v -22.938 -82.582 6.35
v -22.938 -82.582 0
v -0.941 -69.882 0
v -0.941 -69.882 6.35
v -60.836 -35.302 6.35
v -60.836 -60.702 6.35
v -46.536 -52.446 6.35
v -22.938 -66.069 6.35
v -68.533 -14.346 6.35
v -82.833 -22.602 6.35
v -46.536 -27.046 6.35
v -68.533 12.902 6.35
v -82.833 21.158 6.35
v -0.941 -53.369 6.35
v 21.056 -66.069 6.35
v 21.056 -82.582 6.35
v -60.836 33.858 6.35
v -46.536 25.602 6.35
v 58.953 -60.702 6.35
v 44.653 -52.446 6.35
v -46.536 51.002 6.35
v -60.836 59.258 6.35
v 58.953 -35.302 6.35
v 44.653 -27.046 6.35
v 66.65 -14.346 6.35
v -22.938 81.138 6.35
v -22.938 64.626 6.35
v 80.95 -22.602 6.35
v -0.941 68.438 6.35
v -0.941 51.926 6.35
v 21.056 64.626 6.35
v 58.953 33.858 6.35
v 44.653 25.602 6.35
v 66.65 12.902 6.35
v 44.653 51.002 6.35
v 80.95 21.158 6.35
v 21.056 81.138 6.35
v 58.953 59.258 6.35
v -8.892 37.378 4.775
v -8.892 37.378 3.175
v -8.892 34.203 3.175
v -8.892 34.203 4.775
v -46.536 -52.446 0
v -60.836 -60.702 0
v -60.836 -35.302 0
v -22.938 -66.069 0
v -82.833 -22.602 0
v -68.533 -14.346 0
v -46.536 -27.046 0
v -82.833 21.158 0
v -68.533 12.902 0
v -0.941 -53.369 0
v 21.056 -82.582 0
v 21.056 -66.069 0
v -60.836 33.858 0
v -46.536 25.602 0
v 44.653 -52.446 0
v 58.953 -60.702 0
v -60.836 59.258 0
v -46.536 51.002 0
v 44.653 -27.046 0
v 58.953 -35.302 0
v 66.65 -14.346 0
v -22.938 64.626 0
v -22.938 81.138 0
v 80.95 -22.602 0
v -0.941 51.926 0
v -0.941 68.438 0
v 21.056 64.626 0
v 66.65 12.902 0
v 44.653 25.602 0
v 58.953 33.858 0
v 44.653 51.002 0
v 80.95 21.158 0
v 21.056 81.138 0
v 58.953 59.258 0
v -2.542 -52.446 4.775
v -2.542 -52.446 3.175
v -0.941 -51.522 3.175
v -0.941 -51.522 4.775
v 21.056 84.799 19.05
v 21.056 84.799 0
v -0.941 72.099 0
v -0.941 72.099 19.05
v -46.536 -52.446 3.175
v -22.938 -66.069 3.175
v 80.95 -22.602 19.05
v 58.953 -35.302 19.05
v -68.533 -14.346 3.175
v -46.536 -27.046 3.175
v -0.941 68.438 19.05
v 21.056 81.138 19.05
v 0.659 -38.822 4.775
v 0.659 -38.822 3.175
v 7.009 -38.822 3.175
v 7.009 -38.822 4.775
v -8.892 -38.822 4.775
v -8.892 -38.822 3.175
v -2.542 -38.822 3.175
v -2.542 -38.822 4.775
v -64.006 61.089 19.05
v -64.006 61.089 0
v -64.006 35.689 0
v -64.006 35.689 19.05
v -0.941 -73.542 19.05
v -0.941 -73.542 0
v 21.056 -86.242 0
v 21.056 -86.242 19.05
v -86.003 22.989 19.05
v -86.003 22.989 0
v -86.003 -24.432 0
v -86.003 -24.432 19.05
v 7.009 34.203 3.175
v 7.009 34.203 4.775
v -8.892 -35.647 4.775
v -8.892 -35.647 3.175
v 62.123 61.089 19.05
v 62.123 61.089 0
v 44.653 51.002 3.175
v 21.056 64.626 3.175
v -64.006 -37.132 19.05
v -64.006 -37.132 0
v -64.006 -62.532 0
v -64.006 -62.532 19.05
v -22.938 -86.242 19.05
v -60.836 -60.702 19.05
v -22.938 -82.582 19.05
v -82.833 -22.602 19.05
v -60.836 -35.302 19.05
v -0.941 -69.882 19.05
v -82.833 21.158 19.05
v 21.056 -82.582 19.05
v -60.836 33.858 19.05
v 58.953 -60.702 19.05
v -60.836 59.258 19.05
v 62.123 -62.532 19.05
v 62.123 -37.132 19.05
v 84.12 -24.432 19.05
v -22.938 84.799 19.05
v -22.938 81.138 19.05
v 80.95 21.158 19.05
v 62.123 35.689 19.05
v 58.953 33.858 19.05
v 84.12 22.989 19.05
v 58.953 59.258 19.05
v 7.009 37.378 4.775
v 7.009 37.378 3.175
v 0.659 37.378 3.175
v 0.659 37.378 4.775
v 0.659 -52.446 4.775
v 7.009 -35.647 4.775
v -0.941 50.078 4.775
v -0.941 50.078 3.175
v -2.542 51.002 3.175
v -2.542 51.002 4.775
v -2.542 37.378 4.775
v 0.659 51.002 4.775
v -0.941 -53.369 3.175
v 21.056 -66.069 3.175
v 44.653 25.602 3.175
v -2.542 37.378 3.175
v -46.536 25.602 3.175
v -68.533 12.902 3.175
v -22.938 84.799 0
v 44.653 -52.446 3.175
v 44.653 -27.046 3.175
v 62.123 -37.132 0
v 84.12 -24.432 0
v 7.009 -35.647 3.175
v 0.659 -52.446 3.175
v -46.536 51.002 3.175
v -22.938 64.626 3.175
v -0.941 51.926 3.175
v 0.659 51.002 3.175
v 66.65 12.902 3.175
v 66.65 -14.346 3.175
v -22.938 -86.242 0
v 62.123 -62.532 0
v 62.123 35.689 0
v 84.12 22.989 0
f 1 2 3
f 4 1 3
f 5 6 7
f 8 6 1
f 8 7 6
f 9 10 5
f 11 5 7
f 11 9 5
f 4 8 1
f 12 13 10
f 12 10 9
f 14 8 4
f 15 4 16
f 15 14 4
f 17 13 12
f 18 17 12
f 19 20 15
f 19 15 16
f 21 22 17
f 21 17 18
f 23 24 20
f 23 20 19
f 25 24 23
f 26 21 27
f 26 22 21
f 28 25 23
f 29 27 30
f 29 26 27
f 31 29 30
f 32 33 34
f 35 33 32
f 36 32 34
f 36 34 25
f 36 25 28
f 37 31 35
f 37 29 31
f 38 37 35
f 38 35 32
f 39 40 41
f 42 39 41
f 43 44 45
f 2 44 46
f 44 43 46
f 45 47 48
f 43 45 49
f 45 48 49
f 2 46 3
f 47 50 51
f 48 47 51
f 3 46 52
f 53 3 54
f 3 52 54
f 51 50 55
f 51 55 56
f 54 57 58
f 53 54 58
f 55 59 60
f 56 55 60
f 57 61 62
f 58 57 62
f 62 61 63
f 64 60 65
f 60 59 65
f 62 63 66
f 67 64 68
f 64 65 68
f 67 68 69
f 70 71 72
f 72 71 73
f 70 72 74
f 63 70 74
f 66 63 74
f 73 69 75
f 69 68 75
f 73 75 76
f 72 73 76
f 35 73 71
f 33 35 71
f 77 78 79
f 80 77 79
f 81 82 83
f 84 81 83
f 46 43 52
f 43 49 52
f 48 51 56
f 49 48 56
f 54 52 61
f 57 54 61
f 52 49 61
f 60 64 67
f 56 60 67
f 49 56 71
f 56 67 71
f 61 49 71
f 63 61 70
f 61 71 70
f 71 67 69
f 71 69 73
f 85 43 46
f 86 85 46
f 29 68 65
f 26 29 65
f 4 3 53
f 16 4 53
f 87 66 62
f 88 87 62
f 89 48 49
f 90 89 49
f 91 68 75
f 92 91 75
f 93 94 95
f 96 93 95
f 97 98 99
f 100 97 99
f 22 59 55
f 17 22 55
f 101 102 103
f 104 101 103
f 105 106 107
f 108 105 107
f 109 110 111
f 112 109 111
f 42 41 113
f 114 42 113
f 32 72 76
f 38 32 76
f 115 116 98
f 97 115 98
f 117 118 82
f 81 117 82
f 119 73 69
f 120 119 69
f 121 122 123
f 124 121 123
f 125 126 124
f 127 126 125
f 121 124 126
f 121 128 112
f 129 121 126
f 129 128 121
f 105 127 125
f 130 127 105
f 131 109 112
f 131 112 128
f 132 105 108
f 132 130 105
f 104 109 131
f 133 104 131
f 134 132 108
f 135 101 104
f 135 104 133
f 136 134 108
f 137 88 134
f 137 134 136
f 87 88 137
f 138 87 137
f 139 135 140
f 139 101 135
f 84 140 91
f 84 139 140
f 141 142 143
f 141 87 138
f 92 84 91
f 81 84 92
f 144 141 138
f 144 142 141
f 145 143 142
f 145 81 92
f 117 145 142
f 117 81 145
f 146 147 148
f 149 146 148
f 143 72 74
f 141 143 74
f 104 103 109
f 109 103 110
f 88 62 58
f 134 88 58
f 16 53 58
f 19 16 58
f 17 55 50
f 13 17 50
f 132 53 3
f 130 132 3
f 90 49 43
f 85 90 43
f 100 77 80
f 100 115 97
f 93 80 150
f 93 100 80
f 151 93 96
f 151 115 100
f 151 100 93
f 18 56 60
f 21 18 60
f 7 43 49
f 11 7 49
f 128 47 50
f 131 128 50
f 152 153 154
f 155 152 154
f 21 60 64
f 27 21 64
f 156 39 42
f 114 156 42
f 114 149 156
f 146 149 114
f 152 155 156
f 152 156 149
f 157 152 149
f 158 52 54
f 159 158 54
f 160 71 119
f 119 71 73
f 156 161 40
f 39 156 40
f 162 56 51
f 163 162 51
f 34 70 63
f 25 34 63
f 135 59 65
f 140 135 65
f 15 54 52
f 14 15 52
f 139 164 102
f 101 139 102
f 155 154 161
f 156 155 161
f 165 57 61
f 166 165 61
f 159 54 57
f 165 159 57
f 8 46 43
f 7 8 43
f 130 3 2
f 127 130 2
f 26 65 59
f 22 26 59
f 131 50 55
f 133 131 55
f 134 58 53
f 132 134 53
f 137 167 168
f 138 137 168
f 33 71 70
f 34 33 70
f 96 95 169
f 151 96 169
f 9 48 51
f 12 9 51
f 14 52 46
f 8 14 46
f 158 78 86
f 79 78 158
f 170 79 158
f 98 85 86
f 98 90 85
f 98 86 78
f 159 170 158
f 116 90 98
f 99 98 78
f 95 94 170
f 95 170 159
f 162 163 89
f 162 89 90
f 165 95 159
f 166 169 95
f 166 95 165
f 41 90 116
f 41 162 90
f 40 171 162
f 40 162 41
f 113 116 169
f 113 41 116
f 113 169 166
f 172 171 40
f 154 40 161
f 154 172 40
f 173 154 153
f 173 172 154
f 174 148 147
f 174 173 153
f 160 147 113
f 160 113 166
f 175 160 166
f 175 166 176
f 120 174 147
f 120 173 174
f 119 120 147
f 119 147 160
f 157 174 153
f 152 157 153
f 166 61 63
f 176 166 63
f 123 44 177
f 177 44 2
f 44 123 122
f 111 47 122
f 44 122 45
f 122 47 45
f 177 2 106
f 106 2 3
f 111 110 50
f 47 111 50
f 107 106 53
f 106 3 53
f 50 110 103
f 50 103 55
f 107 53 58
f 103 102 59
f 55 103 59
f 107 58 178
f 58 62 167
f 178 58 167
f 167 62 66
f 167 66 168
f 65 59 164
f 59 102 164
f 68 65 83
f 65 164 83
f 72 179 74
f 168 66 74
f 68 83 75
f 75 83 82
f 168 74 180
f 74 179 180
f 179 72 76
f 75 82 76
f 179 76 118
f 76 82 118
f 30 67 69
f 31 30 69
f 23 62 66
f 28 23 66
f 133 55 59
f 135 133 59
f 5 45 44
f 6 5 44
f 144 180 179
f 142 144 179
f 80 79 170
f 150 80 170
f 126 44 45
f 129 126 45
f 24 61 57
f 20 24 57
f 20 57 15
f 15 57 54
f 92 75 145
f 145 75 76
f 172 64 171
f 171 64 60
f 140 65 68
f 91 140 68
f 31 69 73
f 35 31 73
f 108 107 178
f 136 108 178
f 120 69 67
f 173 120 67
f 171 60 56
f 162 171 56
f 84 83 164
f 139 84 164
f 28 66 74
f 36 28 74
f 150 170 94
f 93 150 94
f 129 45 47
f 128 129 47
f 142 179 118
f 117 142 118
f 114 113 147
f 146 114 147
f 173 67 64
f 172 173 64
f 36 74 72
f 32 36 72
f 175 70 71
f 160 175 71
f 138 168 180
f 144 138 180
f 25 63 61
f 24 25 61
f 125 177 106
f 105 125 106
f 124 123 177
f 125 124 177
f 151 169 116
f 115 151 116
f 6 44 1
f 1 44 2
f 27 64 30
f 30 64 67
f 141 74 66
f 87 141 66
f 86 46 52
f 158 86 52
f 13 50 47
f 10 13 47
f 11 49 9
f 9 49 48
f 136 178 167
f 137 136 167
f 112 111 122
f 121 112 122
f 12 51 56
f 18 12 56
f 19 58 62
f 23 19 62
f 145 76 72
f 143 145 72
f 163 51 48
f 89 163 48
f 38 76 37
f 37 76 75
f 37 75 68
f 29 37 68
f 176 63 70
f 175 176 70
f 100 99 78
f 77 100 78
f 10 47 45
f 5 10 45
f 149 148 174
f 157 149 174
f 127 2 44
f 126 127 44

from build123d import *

# Parameters (mm, degrees)
F1_DEPTH = 6.35
F2_DEPTH = 19.05
F3_DEPTH = 3.175
F4_DEPTH = 4.7752


with BuildPart() as f1:
    # F0 (on Top) → F1 (new body)
    with BuildSketch(Plane.XY):
        Polygon((-0.9413762387, 68.4384813374), (-22.9384214948, 81.1384813374), (-60.8358643949, 59.2583824775), (-60.8358643949, 33.8583824775), (-82.832909651, 21.1583824775), (-82.832909651, -22.6018152425), (-60.8358643949, -35.3018152425), (-60.8358643949, -60.7018152425), (-22.9384214948, -82.5819141025), (-0.9413762387, -69.8819141025), (21.0556690175, -82.5819141025), (58.9531119176, -60.7018152425), (58.9531119176, -35.3018152425), (80.9501571737, -22.6018152425), (80.9501571737, 21.1583824775), (58.9531119176, 33.8583824775), (58.9531119176, 59.2583824775), (21.0556690175, 81.1384813374), align=None)
        Polygon((-70.1329112053, 13.8260349561), (-48.1358659492, 26.5260349561), (-48.1358659492, 51.9260349561), (-22.9384214948, 66.4737862947), (-0.9413762387, 53.7737862947), (21.0556690175, 66.4737862947), (46.2531134718, 51.9260349561), (46.2531134718, 26.5260349561), (68.250158728, 13.8260349561), (68.250158728, -15.2694677211), (46.2531134718, -27.9694677211), (46.2531134718, -53.3694677211), (21.0556690175, -67.9172190598), (-0.9413762387, -55.2172190598), (-22.9384214948, -67.9172190598), (-48.1358659492, -53.3694677211), (-48.1358659492, -27.9694677211), (-70.1329112053, -15.2694677211), align=None, mode=Mode.SUBTRACT)
        Polygon((-48.1358659492, 51.9260349561), (-48.1358659492, 26.5260349561), (-70.1329112053, 13.8260349561), (-70.1329112053, -15.2694677211), (-48.1358659492, -27.9694677211), (-48.1358659492, -53.3694677211), (-22.9384214948, -67.9172190598), (-0.9413762387, -55.2172190598), (21.0556690175, -67.9172190598), (46.2531134718, -53.3694677211), (46.2531134718, -27.9694677211), (68.250158728, -15.2694677211), (68.250158728, 13.8260349561), (46.2531134718, 26.5260349561), (46.2531134718, 51.9260349561), (21.0556690175, 66.4737862947), (-0.9413762387, 53.7737862947), (-22.9384214948, 66.4737862947), align=None)
        Polygon((-0.9413762387, -53.3694675591), (-22.9384214948, -66.0694675591), (-46.5356662097, -52.4455919708), (-46.5356662097, -27.0455919708), (-68.5327114659, -14.3455919708), (-68.5327114659, 12.9021592058), (-46.5356662097, 25.6021592058), (-46.5356662097, 51.0021592058), (-22.9384214948, 64.6260347941), (-0.9413762387, 51.9260347941), (21.0556690175, 64.6260347941), (44.6529137324, 51.0021592058), (44.6529137324, 25.6021592058), (66.6499589885, 12.9021592058), (66.6499589885, -14.3455919708), (44.6529137324, -27.0455919708), (44.6529137324, -52.4455919708), (21.0556690175, -66.0694675591), align=None, mode=Mode.SUBTRACT)
    extrude(amount=F1_DEPTH)


with BuildPart() as f2:
    # F0 (on Top) → F2 (new body)
    with BuildSketch(Plane.XY):
        Polygon((-64.0057814345, 61.0885349336), (-64.0057814345, 35.6885349336), (-86.0028266907, 22.9885349336), (-86.0028266907, -24.4319676986), (-64.0057814345, -37.1319676986), (-64.0057814345, -62.5319676986), (-22.9384214948, -86.2422190148), (-0.9413762387, -73.5422190148), (21.0556690175, -86.2422190148), (62.1230289572, -62.5319676986), (62.1230289572, -37.1319676986), (84.1200742133, -24.4319676986), (84.1200742133, 22.9885349336), (62.1230289572, 35.6885349336), (62.1230289572, 61.0885349336), (21.0556690175, 84.7987862497), (-0.9413762387, 72.0987862497), (-22.9384214948, 84.7987862497), align=None)
        Polygon((-60.8358643949, 59.2583824775), (-22.9384214948, 81.1384813374), (-0.9413762387, 68.4384813374), (21.0556690175, 81.1384813374), (58.9531119176, 59.2583824775), (58.9531119176, 33.8583824775), (80.9501571737, 21.1583824775), (80.9501571737, -22.6018152425), (58.9531119176, -35.3018152425), (58.9531119176, -60.7018152425), (21.0556690175, -82.5819141025), (-0.9413762387, -69.8819141025), (-22.9384214948, -82.5819141025), (-60.8358643949, -60.7018152425), (-60.8358643949, -35.3018152425), (-82.832909651, -22.6018152425), (-82.832909651, 21.1583824775), (-60.8358643949, 33.8583824775), align=None, mode=Mode.SUBTRACT)
    extrude(amount=F2_DEPTH)


with BuildPart() as f3:
    # F0 (on Top) → F3 (new body)
    with BuildSketch(Plane.XY):
        Polygon((-46.5356662097, -52.4455919708), (-22.9384214948, -66.0694675591), (-0.9413762387, -53.3694675591), (21.0556690175, -66.0694675591), (44.6529137324, -52.4455919708), (44.6529137324, -27.0455919708), (66.6499589885, -14.3455919708), (66.6499589885, 12.9021592058), (44.6529137324, 25.6021592058), (44.6529137324, 51.0021592058), (21.0556690175, 64.6260347941), (-0.9413762387, 51.9260347941), (-22.9384214948, 64.6260347941), (-46.5356662097, 51.0021592058), (-46.5356662097, 25.6021592058), (-68.5327114659, 12.9021592058), (-68.5327114659, -14.3455919708), (-46.5356662097, -27.0455919708), align=None)
        Polygon((-66.932512007, 11.9782836175), (-44.9354667509, 24.6782836175), (-44.9354667509, 50.0782836175), (-22.9384214948, 62.7782836175), (-2.5415762387, 51.0021595182), (-0.9413762387, 50.0782836175), (0.6588237613, 51.0021595182), (21.0556690175, 62.7782836175), (43.0527142736, 50.0782836175), (43.0527142736, 24.6782836175), (65.0497595297, 11.9782836175), (65.0497595297, -13.4217163825), (43.0527142736, -26.1217163825), (43.0527142736, -51.5217163825), (21.0556690175, -64.2217163825), (0.6588237613, -52.4455922833), (-0.9413762387, -51.5217163825), (-2.5415762387, -52.4455922833), (-22.9384214948, -64.2217163825), (-44.9354667509, -51.5217163825), (-44.9354667509, -26.1217163825), (-66.932512007, -13.4217163825), align=None, mode=Mode.SUBTRACT)
        Polygon((-44.9354667509, 50.0782836175), (-44.9354667509, 24.6782836175), (-66.932512007, 11.9782836175), (-66.932512007, -13.4217163825), (-44.9354667509, -26.1217163825), (-44.9354667509, -51.5217163825), (-22.9384214948, -64.2217163825), (-2.5415762387, -52.4455922833), (-2.5415762387, -51.5217163825), (-2.5415762387, -38.8217163825), (-8.8915762387, -38.8217163825), (-8.8915762387, -35.6467163825), (7.0088237613, -35.6467163825), (7.0088237613, -38.8217163825), (0.6588237613, -38.8217163825), (0.6588237613, -51.5217163825), (0.6588237613, -52.4455922833), (21.0556690175, -64.2217163825), (43.0527142736, -51.5217163825), (43.0527142736, -26.1217163825), (65.0497595297, -13.4217163825), (65.0497595297, 11.9782836175), (43.0527142736, 24.6782836175), (43.0527142736, 50.0782836175), (21.0556690175, 62.7782836175), (0.6588237613, 51.0021595182), (0.6588237613, 50.0782836175), (0.6588237613, 37.3782836175), (7.0088237613, 37.3782836175), (7.0088237613, 34.2032836175), (-8.8915762387, 34.2032836175), (-8.8915762387, 37.3782836175), (-2.5415762387, 37.3782836175), (-2.5415762387, 50.0782836175), (-2.5415762387, 51.0021595182), (-22.9384214948, 62.7782836175), align=None)
    extrude(amount=F3_DEPTH)

    # F0 (on Top) → F4 (join)
    with BuildSketch(Plane.XY):
        Polygon((0.6588237613, 37.3782836175), (-2.5415762387, 37.3782836175), (-8.8915762387, 37.3782836175), (-8.8915762387, 34.2032836175), (7.0088237613, 34.2032836175), (7.0088237613, 37.3782836175), align=None)
        Polygon((-0.9413762387, 50.0782836175), (-2.5415762387, 51.0021595182), (-2.5415762387, 50.0782836175), (-2.5415762387, 37.3782836175), (0.6588237613, 37.3782836175), (0.6588237613, 50.0782836175), (0.6588237613, 51.0021595182), align=None)
        Polygon((-2.5415762387, -51.5217163825), (-2.5415762387, -52.4455922833), (-0.9413762387, -51.5217163825), (0.6588237613, -52.4455922833), (0.6588237613, -51.5217163825), (0.6588237613, -38.8217163825), (-2.5415762387, -38.8217163825), align=None)
        Polygon((-8.8915762387, -38.8217163825), (-2.5415762387, -38.8217163825), (0.6588237613, -38.8217163825), (7.0088237613, -38.8217163825), (7.0088237613, -35.6467163825), (-8.8915762387, -35.6467163825), align=None)
    extrude(amount=F4_DEPTH)


solid = Compound([f1.part, f2.part, f3.part])
